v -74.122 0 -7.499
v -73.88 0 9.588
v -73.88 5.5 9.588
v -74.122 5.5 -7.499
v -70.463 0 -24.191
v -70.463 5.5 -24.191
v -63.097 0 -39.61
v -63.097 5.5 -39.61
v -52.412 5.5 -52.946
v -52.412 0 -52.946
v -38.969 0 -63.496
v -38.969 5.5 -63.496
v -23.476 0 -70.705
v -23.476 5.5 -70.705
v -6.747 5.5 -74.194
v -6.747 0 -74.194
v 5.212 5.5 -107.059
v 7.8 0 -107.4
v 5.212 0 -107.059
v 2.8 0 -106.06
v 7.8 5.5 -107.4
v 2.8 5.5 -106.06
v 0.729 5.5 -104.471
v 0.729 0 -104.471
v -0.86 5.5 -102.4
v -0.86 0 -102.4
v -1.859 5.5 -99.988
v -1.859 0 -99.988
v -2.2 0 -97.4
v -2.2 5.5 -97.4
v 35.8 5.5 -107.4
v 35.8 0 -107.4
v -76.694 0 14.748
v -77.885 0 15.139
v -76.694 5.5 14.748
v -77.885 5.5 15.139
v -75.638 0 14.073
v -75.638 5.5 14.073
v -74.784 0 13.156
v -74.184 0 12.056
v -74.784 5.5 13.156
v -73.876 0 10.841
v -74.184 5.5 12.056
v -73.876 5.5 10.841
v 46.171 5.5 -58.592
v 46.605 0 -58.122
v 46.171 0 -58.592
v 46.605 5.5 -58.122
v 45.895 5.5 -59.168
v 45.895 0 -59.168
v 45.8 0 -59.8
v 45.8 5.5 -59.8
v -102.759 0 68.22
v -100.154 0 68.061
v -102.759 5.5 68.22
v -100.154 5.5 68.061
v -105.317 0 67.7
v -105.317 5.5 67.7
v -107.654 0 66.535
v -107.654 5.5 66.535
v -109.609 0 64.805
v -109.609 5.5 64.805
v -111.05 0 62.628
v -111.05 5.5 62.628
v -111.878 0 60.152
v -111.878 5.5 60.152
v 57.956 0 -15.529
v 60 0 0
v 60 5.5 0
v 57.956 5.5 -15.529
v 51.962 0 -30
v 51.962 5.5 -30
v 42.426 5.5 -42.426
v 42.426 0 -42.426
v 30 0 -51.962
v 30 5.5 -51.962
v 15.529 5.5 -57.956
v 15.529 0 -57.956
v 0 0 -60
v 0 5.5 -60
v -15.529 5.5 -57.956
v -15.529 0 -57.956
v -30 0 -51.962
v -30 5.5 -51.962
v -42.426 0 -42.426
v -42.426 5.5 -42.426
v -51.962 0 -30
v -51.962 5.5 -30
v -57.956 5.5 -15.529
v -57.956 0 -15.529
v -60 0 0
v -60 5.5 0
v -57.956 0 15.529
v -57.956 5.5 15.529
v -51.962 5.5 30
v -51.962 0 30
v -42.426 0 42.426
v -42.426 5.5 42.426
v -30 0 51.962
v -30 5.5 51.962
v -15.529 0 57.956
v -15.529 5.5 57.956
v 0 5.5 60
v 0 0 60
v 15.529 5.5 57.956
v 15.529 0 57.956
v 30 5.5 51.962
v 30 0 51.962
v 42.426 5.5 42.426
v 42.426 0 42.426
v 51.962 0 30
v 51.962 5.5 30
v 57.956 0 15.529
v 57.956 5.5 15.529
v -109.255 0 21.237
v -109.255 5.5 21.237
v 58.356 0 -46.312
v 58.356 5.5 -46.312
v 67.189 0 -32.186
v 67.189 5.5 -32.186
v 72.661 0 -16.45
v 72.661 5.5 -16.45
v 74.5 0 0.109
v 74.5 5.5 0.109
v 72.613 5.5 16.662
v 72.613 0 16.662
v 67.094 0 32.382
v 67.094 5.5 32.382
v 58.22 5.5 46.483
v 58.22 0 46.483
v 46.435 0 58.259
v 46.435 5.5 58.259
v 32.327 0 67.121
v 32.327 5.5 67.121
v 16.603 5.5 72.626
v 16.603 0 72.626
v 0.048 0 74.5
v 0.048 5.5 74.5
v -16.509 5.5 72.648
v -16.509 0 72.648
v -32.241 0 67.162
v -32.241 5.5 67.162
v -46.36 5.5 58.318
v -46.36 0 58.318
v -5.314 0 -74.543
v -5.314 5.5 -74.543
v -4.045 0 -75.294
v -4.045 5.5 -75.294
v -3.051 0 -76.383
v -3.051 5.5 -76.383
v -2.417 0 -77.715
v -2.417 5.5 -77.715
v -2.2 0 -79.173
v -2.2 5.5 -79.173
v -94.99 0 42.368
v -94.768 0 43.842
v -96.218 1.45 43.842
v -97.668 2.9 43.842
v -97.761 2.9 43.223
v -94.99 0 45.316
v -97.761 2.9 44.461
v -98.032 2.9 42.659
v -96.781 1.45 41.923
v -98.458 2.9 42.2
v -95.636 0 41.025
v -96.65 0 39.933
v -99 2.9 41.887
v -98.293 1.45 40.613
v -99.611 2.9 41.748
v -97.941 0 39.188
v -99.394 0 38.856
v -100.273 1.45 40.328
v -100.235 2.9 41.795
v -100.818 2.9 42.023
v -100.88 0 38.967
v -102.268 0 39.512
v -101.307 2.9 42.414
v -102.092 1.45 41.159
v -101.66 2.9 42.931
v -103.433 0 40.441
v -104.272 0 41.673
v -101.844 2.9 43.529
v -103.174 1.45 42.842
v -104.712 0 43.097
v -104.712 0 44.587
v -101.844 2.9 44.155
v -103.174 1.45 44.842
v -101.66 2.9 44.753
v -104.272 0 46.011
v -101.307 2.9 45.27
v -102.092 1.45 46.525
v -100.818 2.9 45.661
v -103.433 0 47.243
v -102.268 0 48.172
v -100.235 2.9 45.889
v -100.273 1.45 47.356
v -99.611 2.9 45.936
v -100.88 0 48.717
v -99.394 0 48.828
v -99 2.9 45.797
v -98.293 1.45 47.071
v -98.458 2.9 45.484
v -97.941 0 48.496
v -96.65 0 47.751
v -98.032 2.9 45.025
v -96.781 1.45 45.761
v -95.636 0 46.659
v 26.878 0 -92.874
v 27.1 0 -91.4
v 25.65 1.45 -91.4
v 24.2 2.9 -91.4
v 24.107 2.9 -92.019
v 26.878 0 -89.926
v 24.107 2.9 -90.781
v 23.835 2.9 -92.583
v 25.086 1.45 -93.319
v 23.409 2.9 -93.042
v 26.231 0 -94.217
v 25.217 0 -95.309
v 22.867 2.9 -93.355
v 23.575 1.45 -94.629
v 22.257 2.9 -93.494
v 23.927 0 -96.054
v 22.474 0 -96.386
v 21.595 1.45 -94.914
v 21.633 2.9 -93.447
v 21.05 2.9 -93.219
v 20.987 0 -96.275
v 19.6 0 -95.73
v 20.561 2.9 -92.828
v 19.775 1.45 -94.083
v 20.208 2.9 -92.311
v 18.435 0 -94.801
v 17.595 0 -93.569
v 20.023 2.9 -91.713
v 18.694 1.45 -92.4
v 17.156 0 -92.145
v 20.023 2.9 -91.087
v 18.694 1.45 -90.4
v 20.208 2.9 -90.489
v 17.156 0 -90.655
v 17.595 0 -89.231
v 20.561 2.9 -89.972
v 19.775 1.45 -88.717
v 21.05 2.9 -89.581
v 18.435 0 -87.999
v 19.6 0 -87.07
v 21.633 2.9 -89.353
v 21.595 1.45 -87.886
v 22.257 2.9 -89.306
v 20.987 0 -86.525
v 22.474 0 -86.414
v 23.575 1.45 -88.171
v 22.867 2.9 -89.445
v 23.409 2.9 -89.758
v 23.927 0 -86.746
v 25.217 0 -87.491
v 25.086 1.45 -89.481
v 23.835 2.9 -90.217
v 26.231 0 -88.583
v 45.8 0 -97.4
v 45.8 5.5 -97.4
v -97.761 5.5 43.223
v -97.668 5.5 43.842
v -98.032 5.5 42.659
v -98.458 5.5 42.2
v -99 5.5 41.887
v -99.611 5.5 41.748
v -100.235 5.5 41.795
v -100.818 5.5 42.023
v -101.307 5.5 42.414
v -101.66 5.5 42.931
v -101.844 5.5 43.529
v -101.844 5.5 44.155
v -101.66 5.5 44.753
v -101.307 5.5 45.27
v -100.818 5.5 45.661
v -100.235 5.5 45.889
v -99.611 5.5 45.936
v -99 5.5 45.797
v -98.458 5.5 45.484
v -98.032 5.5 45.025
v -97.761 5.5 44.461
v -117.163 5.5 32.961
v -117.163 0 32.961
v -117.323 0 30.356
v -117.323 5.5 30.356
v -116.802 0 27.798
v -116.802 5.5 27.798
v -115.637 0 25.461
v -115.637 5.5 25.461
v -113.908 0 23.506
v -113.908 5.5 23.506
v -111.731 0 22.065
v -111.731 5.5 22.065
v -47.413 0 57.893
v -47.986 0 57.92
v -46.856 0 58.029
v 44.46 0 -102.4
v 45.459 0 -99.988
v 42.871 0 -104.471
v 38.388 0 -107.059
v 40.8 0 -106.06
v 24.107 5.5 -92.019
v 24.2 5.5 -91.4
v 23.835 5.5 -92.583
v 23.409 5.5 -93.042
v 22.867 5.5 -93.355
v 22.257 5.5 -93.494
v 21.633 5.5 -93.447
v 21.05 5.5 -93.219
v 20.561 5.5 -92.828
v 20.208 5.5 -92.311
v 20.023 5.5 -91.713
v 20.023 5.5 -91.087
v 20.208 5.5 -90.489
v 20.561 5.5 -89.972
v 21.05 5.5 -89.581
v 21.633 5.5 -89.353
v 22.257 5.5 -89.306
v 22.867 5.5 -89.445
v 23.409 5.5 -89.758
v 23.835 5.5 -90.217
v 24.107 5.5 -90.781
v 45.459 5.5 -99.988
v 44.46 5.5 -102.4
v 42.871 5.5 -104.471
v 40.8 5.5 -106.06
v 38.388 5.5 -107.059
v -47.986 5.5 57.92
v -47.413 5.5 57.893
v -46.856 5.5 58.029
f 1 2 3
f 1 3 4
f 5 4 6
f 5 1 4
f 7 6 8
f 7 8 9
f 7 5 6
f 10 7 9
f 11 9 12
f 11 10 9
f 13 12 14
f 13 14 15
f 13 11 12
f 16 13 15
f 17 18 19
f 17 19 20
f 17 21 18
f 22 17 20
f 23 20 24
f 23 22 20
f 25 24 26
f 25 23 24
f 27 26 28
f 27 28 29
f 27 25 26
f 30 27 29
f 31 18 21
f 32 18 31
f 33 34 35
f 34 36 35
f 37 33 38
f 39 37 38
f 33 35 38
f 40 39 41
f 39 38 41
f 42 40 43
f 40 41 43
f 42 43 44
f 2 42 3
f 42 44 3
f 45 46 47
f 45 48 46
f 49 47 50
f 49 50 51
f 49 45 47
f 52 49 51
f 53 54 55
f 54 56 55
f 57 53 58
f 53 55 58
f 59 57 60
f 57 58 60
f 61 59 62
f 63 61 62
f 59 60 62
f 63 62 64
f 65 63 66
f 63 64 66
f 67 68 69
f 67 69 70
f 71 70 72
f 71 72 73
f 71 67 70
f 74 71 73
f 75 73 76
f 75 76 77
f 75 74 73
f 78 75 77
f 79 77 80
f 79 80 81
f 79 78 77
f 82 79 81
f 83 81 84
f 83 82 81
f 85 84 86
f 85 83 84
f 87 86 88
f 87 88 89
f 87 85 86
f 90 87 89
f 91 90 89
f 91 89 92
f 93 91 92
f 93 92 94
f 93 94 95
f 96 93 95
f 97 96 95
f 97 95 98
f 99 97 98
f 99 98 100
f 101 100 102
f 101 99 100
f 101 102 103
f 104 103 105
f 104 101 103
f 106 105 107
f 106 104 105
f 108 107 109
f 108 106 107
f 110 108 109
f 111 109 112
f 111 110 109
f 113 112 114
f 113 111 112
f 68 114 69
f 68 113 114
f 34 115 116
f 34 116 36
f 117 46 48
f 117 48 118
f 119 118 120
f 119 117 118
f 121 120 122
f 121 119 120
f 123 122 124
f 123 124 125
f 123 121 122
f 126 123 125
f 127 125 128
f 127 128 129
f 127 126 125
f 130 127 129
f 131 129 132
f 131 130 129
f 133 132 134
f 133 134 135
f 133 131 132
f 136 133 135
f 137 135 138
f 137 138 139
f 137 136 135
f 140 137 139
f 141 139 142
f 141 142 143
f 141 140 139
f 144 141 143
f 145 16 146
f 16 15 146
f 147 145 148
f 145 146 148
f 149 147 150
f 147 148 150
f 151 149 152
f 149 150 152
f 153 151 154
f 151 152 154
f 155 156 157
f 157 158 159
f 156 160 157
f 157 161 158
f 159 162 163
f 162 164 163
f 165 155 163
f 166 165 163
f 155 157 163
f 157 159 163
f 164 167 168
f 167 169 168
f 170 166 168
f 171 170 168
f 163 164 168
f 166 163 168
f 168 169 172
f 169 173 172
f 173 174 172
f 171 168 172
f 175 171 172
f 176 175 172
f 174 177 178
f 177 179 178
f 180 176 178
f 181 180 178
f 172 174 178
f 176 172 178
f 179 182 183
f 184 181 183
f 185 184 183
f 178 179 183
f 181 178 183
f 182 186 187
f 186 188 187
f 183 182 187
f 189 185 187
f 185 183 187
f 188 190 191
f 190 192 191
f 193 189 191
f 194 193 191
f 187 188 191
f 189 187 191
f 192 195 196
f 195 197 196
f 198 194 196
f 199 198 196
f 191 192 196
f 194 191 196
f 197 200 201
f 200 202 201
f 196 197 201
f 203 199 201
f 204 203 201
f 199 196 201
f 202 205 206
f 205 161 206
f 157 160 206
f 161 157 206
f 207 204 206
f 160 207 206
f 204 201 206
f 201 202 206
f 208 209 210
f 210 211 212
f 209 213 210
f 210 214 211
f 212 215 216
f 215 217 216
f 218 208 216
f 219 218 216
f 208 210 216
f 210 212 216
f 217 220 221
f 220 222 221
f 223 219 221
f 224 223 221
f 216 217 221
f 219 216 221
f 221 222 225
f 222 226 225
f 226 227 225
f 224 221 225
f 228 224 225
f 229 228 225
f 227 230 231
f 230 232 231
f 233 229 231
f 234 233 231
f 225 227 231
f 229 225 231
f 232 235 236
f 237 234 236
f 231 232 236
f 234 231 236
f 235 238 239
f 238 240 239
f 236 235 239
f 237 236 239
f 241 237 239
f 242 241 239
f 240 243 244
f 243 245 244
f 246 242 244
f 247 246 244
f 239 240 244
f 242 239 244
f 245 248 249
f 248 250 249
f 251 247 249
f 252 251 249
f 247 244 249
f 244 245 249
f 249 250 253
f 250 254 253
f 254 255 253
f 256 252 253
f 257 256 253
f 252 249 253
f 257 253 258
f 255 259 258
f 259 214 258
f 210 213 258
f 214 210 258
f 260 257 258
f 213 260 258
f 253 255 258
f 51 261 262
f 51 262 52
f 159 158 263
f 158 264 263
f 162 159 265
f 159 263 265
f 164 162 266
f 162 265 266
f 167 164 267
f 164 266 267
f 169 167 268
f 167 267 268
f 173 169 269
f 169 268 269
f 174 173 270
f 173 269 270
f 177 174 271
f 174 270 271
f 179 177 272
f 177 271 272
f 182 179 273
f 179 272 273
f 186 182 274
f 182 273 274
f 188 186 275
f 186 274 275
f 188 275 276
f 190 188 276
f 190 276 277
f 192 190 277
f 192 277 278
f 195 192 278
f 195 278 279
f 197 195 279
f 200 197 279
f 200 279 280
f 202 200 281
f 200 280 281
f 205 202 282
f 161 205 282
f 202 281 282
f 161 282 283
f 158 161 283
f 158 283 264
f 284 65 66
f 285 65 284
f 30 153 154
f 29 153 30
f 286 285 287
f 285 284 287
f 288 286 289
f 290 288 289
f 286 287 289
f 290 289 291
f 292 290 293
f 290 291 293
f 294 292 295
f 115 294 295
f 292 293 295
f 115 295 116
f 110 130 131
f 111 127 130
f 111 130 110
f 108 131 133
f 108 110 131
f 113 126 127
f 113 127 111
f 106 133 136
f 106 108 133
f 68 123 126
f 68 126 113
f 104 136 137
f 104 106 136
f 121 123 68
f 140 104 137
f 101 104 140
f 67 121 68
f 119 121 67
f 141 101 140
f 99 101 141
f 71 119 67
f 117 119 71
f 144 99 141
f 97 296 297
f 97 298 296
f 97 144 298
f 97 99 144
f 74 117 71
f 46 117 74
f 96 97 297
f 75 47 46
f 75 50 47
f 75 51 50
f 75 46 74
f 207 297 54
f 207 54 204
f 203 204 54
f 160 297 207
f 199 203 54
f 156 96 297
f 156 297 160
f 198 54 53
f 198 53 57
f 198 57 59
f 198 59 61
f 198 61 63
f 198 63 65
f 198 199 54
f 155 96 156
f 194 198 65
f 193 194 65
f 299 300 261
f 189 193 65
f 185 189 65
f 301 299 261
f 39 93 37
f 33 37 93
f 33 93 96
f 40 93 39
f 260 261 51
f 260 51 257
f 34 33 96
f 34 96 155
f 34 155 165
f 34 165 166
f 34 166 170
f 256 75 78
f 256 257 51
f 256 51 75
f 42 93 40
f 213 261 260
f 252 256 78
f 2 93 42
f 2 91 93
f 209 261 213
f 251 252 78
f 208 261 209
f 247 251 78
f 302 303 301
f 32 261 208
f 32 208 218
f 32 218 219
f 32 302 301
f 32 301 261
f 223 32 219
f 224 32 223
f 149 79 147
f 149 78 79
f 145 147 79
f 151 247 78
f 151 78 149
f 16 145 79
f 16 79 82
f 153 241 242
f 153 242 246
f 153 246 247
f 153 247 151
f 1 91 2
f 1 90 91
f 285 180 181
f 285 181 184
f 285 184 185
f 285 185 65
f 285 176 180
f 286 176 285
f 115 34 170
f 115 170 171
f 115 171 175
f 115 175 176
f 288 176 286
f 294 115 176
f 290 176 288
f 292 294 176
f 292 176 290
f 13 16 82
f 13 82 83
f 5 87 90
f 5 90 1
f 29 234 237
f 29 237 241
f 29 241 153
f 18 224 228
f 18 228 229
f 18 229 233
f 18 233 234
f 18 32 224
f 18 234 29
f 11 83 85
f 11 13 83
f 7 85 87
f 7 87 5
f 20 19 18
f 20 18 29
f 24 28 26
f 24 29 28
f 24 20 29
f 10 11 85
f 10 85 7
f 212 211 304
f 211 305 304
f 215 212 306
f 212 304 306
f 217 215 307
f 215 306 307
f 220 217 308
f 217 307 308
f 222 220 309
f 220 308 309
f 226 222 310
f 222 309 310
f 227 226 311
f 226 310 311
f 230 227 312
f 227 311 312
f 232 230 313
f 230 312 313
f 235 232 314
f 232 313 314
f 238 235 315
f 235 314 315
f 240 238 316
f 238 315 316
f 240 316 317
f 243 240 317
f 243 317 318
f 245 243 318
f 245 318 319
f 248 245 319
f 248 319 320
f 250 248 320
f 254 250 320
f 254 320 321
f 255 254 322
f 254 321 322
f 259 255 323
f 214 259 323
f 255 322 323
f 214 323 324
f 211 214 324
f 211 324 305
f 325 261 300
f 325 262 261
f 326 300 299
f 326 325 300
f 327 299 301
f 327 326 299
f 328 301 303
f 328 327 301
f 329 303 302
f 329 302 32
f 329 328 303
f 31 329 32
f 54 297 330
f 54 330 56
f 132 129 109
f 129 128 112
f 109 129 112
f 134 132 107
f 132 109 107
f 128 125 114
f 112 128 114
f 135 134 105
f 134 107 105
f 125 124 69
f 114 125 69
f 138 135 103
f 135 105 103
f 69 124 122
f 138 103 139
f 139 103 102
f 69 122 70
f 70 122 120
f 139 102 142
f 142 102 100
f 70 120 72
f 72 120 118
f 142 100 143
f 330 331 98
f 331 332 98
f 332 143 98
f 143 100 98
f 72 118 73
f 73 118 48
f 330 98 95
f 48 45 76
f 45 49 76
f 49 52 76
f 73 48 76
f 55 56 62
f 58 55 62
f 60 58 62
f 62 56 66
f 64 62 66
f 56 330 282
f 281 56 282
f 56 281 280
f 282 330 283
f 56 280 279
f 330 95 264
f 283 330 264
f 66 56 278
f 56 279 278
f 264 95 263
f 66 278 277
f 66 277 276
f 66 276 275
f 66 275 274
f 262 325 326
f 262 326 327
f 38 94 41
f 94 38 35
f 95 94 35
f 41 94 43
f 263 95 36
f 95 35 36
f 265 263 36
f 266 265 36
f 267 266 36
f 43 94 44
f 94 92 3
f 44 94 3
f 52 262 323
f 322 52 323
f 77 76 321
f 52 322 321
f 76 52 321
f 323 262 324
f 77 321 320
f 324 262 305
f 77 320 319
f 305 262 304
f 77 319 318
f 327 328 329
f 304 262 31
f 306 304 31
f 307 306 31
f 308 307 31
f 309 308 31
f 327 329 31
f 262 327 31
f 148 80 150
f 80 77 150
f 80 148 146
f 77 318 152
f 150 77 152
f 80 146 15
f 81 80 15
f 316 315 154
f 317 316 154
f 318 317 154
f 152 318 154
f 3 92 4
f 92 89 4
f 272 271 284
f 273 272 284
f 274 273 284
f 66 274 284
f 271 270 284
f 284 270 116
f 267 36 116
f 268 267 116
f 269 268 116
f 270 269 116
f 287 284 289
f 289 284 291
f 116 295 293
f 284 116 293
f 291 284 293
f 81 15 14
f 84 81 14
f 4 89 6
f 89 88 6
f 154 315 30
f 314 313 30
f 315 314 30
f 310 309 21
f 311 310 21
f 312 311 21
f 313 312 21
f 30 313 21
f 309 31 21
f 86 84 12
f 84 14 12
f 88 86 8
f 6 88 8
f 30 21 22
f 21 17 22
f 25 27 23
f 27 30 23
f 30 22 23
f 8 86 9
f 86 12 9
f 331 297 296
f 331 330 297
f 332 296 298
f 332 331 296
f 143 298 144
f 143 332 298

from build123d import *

# Parameters (mm, degrees)
SKETCH1_R                     = 60
BOSS_EXTRUDE1_DEPTH           = 5.5
FILLET1_R                     = 2
FILLET2_R                     = 10
FILLET3_R                     = 5
FILLET4_R                     = 2.15
CSK_FOR_M4_SFHCS1_D           = 4.2
CSK_FOR_M4_SFHCS1_CSINK_D     = 10
CSK_FOR_M4_SFHCS1_CSINK_ANGLE = 90


with BuildPart() as part:
    # Sketch1 → Boss-Extrude1 (new body)
    with BuildSketch(Plane(origin=(0, 0, 0), x_dir=(1, 0, 0), z_dir=(0, 1, 0))):
        with BuildLine():
            Line((-119.071377352, -23.145131139), (-73.131225167, -14.215270156))
            ThreePointArc((-73.131225167, -14.215270156), (-58.179525881, 46.533780937), (-2.2, 74.467509694))
            Line((-2.2, 74.467509694), (-2.2, 107.4))
            Line((-2.2, 107.4), (45.8, 107.4))
            Line((45.8, 107.4), (45.8, 58.758914217))
            ThreePointArc((45.8, 58.758914217), (58.254488227, -46.439903116), (-47.074251085, -57.743093828))
            Line((-47.074251085, -57.743093828), (-109.969788273, -69.96874779))
            Line((-109.969788273, -69.96874779), (-119.071377352, -23.145131139))
        make_face()
        Circle(SKETCH1_R, mode=Mode.SUBTRACT)
    extrude(amount=BOSS_EXTRUDE1_DEPTH)

    # Fillet1
    fillet1_edges = [part.edges().sort_by_distance(p)[0] for p in [
        (-47.074251085, 2.75, 57.743093828),
    ]]
    fillet(fillet1_edges, radius=FILLET1_R)

    # Fillet2
    fillet2_edges = [part.edges().sort_by_distance(p)[0] for p in [
        (-119.071377352, 2.75, 23.145131139),
        (-2.2, 2.75, -107.4),
        (45.8, 2.75, -107.4),
        (-109.969788273, 2.75, 69.96874779),
    ]]
    fillet(fillet2_edges, radius=FILLET2_R)

    # Fillet3
    fillet3_edges = [part.edges().sort_by_distance(p)[0] for p in [
        (-73.131225167, 2.75, 14.215270156),
        (-2.2, 2.75, -74.467509694),
    ]]
    fillet(fillet3_edges, radius=FILLET3_R)

    # Fillet4
    fillet4_edges = [part.edges().sort_by_distance(p)[0] for p in [
        (45.8, 2.75, -58.758914217),
    ]]
    fillet(fillet4_edges, radius=FILLET4_R)

    # CSK for M4 SFHCS1 (through all)
    with Locations(Plane(origin=(0, 0, 0), x_dir=(-1, 0, 0), z_dir=(0, -1, 0))):
        with Locations((-22.1, 91.4), (99.767553711, -43.842048611)):
            CounterSinkHole(CSK_FOR_M4_SFHCS1_D / 2, CSK_FOR_M4_SFHCS1_CSINK_D / 2, counter_sink_angle=CSK_FOR_M4_SFHCS1_CSINK_ANGLE)


solid = part.part
